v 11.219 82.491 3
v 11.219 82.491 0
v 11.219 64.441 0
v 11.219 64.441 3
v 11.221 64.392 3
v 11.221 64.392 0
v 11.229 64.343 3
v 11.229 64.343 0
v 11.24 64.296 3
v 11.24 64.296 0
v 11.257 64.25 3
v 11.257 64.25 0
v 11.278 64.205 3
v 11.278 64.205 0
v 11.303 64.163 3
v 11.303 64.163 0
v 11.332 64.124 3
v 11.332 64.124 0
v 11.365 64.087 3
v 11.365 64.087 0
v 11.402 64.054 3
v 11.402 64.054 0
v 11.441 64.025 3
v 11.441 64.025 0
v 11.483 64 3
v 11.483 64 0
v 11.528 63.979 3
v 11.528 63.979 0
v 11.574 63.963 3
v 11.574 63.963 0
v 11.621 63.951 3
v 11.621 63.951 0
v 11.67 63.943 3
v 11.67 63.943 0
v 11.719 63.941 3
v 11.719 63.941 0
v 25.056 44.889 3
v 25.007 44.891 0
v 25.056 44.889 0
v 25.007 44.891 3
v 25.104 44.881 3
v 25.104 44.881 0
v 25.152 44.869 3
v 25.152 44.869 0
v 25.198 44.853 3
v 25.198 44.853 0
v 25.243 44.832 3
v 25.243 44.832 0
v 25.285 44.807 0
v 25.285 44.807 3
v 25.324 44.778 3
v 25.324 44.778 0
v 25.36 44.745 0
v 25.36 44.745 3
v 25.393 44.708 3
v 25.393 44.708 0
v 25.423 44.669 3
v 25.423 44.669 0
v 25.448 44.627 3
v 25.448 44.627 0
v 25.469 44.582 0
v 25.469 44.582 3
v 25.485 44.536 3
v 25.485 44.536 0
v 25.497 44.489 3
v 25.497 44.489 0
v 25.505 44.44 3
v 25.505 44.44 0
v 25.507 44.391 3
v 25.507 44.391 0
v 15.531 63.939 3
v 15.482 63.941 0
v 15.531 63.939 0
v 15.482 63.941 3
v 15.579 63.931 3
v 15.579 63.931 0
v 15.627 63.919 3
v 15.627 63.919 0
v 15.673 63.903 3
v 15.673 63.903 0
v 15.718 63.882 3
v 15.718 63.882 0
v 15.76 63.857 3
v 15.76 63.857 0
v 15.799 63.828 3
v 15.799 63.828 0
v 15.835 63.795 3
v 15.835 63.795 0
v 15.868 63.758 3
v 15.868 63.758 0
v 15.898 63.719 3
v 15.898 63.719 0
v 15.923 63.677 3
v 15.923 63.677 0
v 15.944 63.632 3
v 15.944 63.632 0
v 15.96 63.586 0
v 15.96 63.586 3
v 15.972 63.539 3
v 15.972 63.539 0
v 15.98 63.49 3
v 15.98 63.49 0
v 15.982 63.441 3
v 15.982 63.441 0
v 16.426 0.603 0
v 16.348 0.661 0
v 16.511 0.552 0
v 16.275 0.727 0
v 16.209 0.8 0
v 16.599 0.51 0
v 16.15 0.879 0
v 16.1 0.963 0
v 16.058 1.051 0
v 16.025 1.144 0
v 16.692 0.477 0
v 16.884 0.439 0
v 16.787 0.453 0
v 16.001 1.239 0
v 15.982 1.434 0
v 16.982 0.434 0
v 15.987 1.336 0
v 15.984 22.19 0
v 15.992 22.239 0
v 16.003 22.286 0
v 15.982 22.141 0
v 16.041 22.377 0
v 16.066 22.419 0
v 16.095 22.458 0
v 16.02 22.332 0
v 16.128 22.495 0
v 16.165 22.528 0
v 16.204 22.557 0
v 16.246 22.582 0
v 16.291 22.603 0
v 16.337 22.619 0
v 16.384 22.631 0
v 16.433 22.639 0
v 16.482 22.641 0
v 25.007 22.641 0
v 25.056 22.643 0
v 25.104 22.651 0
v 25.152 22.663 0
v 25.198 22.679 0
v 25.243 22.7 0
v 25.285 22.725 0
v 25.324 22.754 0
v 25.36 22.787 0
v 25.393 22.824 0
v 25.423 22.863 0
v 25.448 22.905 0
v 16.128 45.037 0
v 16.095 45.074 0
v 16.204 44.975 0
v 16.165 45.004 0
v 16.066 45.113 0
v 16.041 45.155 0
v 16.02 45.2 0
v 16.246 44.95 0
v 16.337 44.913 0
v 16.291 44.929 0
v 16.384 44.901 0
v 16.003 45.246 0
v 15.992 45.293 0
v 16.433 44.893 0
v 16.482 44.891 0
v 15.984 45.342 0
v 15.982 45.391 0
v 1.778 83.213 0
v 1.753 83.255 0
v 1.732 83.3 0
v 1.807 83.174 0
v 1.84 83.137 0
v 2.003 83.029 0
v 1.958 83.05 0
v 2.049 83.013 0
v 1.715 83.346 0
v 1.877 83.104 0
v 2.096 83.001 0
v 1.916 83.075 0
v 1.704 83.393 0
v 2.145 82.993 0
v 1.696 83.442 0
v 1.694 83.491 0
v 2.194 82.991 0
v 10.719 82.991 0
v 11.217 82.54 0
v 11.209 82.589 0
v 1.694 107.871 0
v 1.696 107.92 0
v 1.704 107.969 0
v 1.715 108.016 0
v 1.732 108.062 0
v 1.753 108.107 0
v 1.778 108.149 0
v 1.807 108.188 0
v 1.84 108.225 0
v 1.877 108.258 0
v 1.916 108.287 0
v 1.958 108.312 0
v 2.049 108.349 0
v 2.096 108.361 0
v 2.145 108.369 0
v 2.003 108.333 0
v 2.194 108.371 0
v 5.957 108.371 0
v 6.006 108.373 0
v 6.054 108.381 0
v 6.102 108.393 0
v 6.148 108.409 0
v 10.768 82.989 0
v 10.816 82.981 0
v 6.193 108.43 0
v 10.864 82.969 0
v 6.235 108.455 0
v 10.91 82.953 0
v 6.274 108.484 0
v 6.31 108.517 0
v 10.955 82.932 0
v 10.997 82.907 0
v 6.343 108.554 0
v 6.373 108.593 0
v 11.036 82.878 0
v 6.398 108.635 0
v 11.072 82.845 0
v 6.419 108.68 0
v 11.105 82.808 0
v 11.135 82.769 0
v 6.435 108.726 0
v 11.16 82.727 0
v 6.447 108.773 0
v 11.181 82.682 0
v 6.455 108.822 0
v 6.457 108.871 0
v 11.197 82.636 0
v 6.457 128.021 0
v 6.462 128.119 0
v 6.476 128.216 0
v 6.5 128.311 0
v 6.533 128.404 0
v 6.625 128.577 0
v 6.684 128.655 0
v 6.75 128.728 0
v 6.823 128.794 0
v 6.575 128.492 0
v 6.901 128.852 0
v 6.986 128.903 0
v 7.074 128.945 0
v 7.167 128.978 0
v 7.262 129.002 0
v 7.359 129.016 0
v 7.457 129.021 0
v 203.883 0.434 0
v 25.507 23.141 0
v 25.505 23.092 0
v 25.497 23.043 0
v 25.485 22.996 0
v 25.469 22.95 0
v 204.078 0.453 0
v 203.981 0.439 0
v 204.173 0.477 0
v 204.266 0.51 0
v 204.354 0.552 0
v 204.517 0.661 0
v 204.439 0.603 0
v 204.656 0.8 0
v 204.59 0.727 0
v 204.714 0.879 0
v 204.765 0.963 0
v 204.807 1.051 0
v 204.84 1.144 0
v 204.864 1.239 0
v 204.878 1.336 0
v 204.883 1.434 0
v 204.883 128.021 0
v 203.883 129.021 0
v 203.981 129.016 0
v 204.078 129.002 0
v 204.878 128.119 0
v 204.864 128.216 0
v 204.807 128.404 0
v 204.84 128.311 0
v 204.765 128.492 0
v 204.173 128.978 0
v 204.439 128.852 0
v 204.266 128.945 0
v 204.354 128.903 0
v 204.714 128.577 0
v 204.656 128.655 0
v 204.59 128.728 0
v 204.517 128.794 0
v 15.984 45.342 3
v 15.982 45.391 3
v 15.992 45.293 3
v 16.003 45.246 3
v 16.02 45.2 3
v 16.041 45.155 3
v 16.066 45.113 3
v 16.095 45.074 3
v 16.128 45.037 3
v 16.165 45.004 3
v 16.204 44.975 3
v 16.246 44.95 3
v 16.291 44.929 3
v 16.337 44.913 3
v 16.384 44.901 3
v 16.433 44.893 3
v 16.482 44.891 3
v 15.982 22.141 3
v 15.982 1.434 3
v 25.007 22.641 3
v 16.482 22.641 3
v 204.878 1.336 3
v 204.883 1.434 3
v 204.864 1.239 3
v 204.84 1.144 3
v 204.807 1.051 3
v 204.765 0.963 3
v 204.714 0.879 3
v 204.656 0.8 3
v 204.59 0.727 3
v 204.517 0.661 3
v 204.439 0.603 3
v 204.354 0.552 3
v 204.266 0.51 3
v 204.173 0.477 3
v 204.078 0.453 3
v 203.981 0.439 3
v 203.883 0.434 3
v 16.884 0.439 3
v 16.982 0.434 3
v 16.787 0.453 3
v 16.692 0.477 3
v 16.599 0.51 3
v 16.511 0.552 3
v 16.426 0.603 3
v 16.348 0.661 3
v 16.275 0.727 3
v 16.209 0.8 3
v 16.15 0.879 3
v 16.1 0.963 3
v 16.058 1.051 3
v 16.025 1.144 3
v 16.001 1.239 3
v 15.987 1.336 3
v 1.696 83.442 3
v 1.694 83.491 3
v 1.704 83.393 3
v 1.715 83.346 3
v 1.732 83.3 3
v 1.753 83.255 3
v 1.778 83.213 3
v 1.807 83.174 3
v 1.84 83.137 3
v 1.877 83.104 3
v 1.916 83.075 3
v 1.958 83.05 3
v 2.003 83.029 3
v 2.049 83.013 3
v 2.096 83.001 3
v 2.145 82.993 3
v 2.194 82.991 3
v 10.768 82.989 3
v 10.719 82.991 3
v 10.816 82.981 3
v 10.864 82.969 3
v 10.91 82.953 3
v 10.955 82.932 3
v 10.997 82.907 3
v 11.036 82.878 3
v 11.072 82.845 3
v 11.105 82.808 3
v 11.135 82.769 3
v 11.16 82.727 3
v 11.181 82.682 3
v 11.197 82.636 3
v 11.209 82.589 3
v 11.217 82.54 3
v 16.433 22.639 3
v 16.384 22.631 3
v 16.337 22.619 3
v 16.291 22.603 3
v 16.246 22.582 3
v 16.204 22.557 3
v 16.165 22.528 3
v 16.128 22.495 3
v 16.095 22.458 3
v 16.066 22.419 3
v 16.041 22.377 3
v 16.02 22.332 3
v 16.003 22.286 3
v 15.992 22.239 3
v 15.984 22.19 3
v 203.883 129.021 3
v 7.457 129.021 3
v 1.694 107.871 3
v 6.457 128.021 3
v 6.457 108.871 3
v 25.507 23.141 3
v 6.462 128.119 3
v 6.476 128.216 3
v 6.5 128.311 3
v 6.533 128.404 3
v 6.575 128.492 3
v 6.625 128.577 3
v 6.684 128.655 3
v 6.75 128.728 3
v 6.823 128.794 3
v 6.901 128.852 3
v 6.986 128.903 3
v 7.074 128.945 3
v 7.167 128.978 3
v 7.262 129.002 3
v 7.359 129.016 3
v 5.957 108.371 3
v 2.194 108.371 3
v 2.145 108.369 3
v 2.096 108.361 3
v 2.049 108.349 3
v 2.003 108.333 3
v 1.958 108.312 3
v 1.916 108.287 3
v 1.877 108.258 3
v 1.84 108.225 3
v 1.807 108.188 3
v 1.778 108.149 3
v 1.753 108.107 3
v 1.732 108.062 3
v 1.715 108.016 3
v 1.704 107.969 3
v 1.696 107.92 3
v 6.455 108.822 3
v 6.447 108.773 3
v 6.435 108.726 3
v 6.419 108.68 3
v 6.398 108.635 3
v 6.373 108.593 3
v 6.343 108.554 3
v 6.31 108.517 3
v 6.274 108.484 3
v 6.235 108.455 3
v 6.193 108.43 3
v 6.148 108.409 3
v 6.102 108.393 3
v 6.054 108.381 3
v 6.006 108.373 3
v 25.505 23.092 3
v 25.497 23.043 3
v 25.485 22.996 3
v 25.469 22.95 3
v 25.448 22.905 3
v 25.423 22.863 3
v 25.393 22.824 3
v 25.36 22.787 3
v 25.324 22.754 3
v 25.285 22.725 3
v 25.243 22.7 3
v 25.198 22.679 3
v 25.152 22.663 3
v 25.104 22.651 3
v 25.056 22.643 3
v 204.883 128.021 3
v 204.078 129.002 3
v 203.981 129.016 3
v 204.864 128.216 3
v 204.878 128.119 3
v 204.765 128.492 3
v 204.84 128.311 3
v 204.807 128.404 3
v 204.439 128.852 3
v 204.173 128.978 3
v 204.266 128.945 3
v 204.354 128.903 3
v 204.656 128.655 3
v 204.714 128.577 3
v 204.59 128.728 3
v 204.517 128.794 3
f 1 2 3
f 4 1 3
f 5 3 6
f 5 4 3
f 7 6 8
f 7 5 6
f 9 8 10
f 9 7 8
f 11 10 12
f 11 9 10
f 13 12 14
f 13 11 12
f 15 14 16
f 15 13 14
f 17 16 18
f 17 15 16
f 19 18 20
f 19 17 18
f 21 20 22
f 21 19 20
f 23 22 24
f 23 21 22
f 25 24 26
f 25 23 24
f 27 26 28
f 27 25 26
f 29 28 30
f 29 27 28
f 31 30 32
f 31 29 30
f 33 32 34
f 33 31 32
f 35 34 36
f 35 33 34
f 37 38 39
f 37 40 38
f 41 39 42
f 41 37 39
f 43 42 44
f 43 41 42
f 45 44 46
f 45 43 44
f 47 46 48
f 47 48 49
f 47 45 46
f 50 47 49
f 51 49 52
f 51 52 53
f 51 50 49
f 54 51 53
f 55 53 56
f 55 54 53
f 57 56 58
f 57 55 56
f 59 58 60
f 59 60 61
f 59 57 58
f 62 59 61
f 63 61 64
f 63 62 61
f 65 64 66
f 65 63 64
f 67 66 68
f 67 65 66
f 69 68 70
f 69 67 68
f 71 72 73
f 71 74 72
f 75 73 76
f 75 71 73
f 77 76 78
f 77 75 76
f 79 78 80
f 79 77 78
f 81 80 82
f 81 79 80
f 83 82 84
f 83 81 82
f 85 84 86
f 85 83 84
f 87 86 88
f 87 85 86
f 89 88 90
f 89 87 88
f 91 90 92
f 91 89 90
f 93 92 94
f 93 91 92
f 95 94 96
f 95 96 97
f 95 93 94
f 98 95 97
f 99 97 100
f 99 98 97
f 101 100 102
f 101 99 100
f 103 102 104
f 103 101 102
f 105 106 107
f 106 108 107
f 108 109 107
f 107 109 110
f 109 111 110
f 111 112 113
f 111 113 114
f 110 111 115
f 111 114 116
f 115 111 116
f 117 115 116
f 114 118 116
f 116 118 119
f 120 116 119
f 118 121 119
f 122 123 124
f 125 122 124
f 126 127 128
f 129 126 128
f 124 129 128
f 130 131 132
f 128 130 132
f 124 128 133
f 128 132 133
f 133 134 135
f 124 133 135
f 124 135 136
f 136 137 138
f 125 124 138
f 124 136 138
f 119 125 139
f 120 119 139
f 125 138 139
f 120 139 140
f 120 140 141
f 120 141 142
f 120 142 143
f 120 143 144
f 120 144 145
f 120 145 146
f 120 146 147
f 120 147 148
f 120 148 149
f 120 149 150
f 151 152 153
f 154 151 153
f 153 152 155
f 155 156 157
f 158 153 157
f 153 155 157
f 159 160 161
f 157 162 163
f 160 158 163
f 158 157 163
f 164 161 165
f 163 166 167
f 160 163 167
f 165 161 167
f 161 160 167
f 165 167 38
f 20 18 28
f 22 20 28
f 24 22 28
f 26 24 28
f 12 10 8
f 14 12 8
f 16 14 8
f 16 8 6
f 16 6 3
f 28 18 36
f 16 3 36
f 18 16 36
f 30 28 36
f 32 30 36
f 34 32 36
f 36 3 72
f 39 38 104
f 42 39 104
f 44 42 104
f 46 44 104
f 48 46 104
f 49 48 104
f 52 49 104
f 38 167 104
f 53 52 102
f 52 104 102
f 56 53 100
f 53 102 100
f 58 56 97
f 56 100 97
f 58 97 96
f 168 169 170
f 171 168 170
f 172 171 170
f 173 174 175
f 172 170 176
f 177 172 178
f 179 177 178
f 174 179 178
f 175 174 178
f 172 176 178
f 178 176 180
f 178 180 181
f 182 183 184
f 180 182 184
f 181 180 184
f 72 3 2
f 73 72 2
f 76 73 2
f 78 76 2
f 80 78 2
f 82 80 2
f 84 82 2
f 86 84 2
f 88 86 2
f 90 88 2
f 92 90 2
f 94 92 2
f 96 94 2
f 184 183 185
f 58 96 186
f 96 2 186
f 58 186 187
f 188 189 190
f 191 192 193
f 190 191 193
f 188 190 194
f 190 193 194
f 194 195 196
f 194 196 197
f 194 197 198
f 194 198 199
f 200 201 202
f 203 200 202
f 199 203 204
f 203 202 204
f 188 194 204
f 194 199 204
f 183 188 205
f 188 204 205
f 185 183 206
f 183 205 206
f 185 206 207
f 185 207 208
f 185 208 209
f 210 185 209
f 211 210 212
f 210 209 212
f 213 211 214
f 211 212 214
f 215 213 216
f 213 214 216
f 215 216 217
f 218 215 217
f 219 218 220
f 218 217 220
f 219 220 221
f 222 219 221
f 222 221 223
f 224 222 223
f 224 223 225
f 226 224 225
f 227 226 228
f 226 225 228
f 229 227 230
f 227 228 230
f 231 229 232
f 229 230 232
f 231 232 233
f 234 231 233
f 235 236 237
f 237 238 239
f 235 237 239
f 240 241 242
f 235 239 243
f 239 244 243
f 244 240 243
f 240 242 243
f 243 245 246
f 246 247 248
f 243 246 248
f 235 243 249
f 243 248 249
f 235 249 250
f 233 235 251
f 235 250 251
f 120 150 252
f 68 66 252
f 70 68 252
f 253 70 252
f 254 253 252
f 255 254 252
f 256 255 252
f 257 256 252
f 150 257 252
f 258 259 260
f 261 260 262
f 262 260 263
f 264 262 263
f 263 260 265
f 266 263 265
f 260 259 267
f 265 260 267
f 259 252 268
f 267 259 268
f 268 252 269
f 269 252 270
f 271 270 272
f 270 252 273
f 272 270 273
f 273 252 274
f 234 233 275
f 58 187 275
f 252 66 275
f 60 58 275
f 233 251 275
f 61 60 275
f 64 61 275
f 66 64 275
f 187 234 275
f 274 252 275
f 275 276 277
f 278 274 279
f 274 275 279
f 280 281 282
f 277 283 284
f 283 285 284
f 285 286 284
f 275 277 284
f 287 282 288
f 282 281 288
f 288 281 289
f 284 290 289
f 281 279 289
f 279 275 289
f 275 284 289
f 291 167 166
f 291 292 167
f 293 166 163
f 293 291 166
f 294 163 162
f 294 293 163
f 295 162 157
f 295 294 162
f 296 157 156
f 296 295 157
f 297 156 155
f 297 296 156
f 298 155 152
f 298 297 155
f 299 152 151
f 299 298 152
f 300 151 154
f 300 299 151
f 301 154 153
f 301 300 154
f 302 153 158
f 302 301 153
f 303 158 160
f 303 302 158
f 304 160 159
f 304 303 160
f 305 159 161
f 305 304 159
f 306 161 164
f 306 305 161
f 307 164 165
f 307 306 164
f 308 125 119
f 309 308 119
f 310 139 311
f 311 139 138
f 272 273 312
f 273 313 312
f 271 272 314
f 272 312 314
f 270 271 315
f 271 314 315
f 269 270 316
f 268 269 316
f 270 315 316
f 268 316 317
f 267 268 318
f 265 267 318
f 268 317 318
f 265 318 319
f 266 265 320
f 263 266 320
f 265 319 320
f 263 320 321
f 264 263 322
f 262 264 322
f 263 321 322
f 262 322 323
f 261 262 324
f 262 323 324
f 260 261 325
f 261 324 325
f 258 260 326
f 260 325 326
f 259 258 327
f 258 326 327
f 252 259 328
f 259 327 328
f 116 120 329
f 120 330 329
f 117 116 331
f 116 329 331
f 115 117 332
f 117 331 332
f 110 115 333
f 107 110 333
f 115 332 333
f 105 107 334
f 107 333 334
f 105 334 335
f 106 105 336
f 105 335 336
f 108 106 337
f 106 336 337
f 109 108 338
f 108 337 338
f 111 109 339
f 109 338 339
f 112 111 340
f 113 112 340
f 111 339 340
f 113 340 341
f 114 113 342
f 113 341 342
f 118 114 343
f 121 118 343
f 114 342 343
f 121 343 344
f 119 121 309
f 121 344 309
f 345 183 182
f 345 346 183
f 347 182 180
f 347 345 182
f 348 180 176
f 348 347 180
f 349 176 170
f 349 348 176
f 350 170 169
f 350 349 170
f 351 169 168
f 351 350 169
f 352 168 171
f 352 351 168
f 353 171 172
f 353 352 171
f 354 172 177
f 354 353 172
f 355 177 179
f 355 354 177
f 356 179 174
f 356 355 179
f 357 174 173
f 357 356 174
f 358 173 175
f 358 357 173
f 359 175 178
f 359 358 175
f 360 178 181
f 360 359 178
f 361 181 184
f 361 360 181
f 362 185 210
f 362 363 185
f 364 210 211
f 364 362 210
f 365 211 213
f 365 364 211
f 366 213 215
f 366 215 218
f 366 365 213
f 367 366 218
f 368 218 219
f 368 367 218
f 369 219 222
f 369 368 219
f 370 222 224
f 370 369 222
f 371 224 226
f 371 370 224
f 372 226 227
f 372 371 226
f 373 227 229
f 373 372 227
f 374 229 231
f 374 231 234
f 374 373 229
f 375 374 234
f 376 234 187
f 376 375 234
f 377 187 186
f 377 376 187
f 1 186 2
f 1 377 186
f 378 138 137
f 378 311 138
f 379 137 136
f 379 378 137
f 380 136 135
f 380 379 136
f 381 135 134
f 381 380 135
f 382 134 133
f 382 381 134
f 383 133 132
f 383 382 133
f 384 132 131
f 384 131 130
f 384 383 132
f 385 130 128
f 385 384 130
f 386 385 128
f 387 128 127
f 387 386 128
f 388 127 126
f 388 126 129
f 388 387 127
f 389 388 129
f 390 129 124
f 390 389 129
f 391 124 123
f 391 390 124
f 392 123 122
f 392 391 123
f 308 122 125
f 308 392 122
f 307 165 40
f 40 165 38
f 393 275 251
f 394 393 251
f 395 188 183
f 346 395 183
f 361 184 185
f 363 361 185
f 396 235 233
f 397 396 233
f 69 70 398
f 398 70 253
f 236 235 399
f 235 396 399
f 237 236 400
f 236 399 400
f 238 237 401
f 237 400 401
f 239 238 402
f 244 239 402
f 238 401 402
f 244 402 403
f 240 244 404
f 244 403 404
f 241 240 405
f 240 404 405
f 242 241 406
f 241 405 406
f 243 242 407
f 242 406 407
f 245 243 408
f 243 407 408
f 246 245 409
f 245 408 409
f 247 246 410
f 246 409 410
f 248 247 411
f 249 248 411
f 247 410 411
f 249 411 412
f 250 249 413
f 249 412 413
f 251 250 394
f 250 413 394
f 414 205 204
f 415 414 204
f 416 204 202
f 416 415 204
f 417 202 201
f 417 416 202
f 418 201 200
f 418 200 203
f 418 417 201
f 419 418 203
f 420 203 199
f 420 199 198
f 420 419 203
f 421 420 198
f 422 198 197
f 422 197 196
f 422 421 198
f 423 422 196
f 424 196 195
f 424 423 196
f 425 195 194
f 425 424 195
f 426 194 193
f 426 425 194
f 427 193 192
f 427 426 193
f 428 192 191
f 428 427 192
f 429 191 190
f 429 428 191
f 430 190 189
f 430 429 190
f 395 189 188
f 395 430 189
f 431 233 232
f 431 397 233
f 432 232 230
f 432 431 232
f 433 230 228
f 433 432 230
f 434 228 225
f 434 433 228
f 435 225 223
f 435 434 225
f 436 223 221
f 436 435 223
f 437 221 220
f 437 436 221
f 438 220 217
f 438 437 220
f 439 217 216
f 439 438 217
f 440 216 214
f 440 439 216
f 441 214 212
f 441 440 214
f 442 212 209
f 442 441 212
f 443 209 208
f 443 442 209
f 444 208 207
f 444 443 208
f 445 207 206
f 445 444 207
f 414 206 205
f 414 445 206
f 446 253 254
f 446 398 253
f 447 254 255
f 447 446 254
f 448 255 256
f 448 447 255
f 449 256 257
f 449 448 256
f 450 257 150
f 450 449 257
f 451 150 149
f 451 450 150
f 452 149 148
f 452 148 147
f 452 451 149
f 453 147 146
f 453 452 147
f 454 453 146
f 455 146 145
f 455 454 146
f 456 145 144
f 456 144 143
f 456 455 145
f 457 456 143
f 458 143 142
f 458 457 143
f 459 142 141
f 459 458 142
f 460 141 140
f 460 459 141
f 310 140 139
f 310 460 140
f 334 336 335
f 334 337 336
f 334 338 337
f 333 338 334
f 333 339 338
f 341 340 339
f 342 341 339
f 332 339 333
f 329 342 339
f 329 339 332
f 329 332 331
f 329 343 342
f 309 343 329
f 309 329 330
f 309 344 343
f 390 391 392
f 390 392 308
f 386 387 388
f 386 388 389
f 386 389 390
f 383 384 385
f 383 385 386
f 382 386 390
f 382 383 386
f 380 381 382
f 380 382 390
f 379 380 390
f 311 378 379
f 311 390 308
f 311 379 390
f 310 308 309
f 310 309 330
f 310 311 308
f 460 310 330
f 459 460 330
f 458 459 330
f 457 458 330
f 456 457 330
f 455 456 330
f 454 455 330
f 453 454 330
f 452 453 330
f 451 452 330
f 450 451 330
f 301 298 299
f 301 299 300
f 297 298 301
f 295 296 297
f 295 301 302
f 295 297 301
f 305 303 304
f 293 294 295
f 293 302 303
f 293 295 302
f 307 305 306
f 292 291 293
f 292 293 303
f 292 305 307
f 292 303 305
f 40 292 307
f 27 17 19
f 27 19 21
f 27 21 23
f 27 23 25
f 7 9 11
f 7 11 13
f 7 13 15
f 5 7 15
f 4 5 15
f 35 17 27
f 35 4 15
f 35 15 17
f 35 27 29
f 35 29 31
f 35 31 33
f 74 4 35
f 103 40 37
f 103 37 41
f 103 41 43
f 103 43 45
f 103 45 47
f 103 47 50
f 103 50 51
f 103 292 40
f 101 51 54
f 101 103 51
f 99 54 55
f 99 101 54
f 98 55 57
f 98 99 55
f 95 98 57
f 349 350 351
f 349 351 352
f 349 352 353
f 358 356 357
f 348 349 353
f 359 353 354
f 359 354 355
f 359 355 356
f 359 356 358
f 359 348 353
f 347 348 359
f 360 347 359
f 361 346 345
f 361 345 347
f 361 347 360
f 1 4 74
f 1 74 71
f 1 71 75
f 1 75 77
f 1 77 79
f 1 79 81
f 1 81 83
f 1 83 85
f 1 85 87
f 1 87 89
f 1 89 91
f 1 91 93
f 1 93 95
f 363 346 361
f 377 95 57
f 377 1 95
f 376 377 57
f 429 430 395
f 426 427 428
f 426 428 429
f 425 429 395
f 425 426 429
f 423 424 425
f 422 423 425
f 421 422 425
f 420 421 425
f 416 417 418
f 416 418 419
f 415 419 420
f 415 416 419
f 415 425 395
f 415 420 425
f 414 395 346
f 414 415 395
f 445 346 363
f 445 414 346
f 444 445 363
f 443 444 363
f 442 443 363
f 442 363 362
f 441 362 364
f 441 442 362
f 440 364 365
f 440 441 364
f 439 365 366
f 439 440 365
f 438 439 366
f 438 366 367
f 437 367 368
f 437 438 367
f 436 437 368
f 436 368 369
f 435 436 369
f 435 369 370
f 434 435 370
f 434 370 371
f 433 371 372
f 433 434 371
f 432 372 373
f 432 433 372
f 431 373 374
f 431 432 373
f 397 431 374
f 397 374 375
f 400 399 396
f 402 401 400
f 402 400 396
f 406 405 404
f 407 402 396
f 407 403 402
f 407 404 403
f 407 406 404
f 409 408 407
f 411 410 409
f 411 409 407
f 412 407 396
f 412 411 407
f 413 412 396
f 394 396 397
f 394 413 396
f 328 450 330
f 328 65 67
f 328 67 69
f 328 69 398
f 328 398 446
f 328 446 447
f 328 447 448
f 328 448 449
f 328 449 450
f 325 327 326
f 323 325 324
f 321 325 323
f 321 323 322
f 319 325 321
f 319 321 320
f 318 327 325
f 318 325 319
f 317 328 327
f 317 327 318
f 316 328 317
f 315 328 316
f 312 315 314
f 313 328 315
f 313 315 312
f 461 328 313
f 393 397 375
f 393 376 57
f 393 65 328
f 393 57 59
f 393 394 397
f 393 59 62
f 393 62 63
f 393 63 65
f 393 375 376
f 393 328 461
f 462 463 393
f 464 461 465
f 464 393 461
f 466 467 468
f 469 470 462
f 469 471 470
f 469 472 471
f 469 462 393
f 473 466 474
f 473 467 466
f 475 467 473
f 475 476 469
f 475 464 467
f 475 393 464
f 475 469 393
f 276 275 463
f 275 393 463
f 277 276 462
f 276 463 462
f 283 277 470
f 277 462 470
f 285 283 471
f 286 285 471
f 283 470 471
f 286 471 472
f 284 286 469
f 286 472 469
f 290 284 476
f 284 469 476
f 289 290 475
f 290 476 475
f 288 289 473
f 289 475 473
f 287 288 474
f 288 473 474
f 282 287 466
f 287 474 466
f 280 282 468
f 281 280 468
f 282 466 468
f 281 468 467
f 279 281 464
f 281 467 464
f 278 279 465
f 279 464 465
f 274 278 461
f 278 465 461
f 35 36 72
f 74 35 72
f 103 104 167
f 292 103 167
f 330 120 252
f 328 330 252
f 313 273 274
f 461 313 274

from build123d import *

# Parameters (mm, degrees)
EXTRUDE_1_DEPTH = 3
FILLET_1_R      = 0.5
FILLET_2_R      = 1


with BuildPart() as part:
    # Model → 凸台-拉伸1 (new body)
    with BuildSketch(Plane.XY):
        Polygon((204.883, 129.021), (6.45693, 129.021), (6.45693, 108.371), (1.69393, 108.371), (1.69393, 82.991), (11.21893, 82.991), (11.21893, 63.941), (15.98193, 63.941), (15.98193, 44.891), (25.50693, 44.891), (25.50693, 22.641), (15.98193, 22.641), (15.98193, 0.434082), (204.883, 0.434082), align=None)
    extrude(amount=EXTRUDE_1_DEPTH)

    # 圆角1
    fillet_1_edges = [part.edges().sort_by_distance(p)[0] for p in [
        (15.98193, 22.641, 1.5),
        (25.50693, 22.641, 1.5),
        (25.50693, 44.891, 1.5),
        (15.98193, 44.891, 1.5),
        (15.98193, 63.941, 1.5),
        (11.21893, 63.941, 1.5),
        (11.21893, 82.991, 1.5),
        (1.69393, 82.991, 1.5),
        (1.69393, 108.371, 1.5),
        (6.45693, 108.371, 1.5),
    ]]
    fillet(fillet_1_edges, radius=FILLET_1_R)

    # 圆角2
    fillet_2_edges = [part.edges().sort_by_distance(p)[0] for p in [
        (6.45693, 129.021, 1.5),
        (204.883, 129.021, 1.5),
        (204.883, 0.434082, 1.5),
        (15.98193, 0.434082, 1.5),
    ]]
    fillet(fillet_2_edges, radius=FILLET_2_R)


solid = part.part
